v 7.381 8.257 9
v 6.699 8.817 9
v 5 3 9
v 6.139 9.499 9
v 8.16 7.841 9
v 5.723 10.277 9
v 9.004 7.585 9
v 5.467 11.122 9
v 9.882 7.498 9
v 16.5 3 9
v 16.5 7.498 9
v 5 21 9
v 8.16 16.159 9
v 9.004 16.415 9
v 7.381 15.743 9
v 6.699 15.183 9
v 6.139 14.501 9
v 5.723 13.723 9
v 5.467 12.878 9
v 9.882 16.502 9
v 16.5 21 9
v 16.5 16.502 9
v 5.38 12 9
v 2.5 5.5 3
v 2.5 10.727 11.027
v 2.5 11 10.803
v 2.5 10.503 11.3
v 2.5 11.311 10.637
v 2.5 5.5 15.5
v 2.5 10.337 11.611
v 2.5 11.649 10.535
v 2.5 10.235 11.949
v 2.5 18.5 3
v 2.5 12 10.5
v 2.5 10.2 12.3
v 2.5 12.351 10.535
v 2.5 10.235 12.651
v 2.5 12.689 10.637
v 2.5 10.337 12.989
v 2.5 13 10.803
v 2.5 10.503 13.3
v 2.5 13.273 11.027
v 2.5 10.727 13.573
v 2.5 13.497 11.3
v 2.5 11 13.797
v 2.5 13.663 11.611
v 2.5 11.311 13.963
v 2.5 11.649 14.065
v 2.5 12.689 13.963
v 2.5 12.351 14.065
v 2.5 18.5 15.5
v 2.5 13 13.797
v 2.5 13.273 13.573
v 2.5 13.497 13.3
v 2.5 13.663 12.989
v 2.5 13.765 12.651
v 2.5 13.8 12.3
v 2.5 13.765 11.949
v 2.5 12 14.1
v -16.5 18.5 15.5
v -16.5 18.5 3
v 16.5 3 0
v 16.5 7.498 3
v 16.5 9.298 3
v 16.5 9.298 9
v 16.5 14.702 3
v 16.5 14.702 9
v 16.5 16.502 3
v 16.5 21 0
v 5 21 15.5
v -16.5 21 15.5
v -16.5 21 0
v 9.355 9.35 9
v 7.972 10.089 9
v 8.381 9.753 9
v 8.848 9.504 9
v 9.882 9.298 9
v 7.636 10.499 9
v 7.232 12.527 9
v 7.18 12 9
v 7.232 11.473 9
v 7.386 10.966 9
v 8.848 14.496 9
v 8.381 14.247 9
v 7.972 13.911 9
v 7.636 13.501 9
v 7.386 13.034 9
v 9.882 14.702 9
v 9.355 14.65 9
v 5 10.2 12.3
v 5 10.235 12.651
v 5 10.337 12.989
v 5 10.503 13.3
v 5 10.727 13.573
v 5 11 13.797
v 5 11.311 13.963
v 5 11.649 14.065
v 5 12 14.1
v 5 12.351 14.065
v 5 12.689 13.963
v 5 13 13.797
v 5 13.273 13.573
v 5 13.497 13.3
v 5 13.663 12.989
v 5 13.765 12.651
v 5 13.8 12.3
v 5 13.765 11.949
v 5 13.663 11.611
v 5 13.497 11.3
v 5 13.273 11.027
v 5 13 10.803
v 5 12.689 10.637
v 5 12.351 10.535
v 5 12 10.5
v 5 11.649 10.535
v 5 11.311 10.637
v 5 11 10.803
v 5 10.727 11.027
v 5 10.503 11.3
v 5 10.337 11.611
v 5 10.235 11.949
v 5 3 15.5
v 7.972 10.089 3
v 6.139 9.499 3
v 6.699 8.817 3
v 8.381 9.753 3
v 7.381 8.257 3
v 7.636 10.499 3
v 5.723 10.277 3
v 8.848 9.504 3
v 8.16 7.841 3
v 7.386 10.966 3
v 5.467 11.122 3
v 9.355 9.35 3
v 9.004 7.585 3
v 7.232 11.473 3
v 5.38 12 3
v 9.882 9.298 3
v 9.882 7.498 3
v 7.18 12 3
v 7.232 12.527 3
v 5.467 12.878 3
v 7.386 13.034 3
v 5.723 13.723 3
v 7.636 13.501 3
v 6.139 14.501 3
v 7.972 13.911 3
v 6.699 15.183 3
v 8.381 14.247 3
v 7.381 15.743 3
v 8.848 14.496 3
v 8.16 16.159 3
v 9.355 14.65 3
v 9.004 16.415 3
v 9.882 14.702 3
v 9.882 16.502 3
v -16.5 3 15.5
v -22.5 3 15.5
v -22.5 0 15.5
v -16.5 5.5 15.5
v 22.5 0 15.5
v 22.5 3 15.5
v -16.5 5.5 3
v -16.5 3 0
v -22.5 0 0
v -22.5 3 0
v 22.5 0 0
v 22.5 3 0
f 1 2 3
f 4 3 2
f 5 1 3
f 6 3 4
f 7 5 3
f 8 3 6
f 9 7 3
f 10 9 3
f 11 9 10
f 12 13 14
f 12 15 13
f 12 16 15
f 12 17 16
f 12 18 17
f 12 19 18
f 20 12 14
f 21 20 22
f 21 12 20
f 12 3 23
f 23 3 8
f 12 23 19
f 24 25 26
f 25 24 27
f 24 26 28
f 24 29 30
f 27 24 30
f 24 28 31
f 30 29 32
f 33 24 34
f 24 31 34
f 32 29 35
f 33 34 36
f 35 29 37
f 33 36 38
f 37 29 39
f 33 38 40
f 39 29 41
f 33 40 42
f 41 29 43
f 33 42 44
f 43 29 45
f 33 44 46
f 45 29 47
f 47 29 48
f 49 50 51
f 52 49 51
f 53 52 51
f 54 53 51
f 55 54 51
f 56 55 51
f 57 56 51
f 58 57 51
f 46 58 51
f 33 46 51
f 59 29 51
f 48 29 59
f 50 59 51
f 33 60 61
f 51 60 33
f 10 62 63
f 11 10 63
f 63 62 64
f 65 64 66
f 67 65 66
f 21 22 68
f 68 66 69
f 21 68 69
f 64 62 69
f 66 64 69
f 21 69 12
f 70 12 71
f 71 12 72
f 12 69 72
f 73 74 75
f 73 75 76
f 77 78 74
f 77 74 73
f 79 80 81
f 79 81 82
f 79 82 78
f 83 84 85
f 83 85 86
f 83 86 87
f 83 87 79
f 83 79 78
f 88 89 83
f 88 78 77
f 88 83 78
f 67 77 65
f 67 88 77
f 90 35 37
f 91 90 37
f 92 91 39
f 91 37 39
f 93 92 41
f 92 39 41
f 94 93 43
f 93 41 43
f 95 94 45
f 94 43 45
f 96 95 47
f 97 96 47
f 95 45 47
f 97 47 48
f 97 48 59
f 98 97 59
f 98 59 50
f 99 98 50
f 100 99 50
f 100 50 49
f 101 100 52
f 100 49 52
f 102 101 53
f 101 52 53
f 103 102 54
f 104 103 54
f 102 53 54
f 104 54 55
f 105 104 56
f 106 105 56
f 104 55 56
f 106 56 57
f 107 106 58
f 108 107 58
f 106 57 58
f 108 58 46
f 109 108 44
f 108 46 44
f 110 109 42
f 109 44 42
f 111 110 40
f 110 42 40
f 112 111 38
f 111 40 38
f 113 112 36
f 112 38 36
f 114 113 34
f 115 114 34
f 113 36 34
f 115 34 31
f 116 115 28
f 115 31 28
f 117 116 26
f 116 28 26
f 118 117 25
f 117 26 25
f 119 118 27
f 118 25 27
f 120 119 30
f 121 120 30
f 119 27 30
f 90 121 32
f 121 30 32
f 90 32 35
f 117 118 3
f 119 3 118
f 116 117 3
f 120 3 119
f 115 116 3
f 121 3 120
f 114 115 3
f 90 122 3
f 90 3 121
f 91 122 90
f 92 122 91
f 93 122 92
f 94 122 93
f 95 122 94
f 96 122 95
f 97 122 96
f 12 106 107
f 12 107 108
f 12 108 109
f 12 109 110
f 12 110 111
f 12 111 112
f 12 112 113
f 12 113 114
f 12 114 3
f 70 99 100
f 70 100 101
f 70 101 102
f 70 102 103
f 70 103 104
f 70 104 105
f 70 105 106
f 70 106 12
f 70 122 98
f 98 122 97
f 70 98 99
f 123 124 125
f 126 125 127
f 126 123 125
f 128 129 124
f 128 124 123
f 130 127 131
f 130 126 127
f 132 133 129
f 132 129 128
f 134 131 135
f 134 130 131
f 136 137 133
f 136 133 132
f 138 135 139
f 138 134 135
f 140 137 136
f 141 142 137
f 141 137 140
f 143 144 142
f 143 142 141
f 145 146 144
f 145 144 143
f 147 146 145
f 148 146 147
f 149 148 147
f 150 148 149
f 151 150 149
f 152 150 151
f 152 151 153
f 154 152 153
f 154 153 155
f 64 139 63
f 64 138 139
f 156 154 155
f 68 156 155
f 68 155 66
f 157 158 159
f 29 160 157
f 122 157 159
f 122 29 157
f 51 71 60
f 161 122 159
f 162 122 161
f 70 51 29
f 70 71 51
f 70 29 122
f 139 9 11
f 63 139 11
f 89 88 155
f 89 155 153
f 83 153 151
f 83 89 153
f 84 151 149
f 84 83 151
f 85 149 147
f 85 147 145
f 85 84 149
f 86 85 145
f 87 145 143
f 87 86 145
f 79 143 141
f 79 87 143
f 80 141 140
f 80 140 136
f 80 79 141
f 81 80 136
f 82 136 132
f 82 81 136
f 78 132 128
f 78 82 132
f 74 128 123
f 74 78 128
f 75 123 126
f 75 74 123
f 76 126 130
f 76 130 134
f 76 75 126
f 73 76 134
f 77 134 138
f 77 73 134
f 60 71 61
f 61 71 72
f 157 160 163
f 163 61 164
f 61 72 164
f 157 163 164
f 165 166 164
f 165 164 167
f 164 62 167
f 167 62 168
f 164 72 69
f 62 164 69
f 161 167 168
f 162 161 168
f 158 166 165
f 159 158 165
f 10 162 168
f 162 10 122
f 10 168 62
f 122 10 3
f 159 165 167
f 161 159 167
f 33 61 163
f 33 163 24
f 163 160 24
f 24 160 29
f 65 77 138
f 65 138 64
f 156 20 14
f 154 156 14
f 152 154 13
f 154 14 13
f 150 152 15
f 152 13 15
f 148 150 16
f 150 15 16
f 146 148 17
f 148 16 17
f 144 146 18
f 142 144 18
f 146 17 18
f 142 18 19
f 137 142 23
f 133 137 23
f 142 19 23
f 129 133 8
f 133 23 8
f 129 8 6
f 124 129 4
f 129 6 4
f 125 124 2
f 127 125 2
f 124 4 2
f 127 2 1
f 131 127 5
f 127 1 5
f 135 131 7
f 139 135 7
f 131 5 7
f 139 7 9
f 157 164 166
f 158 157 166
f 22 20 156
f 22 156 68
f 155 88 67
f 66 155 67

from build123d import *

# Parameters (mm, degrees)
PAD_DEPTH       = 15.5
SKETCH001_W     = 11.5
SKETCH001_H     = 18
POCKET_DEPTH    = 6.5
SKETCH002_W     = 28.698795
SKETCH002_H     = 13
POCKET001_DEPTH = 12.5
SKETCH003_R     = 1.8
POCKET002_DEPTH = 2.5
POCKET003_DEPTH = 6


with BuildPart() as part:
    # Sketch → Pad (new body)
    with BuildSketch(Plane.XY):
        Polygon((-16.5, 3), (-22.5, 3), (-22.5, 0), (22.5, 0), (22.5, 3), (16.5, 3), (16.5, 21), (-16.5, 21), align=None)
    extrude(amount=PAD_DEPTH)

    # Sketch001 → Pocket (cut)
    with BuildSketch(Plane.XY.offset(15.5)):
        with Locations((10.75, 12)):
            Rectangle(SKETCH001_W, SKETCH001_H)
    extrude(amount=-POCKET_DEPTH, mode=Mode.SUBTRACT)

    # Sketch002 → Pocket001 (cut)
    with BuildSketch(Plane.XY.offset(15.5)):
        with Locations((-11.8493975, 12)):
            Rectangle(SKETCH002_W, SKETCH002_H)
    extrude(amount=-POCKET001_DEPTH, mode=Mode.SUBTRACT)

    # Sketch003 → Pocket002 (cut)
    with BuildSketch(Plane(origin=(2.5, 0, 0), x_dir=(0, -1, 0), z_dir=(-1, 0, 0))):
        with Locations((-12, 12.3)):
            Circle(SKETCH003_R)
    extrude(amount=-POCKET002_DEPTH, mode=Mode.SUBTRACT)

    # Sketch004 → Pocket003 (cut)
    with BuildSketch(Plane.XY.offset(9)):
        with BuildLine():
            ThreePointArc((9.8823500905, 16.5019904992), (5.3803595914, 12), (9.8823500905, 7.4980095008))
            Line((9.8823500905, 7.4980095008), (17.636722355, 7.4980095008))
            Line((17.636722355, 9.2980095008), (17.636722355, 7.4980095008))
            Line((9.8823500905, 9.2980095008), (17.636722355, 9.2980095008))
            ThreePointArc((9.8823500905, 14.7019904992), (7.1803595914, 12), (9.8823500905, 9.2980095008))
            Line((9.8823500905, 14.7019904992), (17.636722355, 14.7019904992))
            Line((17.636722355, 16.5019904992), (17.636722355, 14.7019904992))
            Line((9.8823500905, 16.5019904992), (17.636722355, 16.5019904992))
        make_face()
    extrude(amount=-POCKET003_DEPTH, mode=Mode.SUBTRACT)


solid = part.part
